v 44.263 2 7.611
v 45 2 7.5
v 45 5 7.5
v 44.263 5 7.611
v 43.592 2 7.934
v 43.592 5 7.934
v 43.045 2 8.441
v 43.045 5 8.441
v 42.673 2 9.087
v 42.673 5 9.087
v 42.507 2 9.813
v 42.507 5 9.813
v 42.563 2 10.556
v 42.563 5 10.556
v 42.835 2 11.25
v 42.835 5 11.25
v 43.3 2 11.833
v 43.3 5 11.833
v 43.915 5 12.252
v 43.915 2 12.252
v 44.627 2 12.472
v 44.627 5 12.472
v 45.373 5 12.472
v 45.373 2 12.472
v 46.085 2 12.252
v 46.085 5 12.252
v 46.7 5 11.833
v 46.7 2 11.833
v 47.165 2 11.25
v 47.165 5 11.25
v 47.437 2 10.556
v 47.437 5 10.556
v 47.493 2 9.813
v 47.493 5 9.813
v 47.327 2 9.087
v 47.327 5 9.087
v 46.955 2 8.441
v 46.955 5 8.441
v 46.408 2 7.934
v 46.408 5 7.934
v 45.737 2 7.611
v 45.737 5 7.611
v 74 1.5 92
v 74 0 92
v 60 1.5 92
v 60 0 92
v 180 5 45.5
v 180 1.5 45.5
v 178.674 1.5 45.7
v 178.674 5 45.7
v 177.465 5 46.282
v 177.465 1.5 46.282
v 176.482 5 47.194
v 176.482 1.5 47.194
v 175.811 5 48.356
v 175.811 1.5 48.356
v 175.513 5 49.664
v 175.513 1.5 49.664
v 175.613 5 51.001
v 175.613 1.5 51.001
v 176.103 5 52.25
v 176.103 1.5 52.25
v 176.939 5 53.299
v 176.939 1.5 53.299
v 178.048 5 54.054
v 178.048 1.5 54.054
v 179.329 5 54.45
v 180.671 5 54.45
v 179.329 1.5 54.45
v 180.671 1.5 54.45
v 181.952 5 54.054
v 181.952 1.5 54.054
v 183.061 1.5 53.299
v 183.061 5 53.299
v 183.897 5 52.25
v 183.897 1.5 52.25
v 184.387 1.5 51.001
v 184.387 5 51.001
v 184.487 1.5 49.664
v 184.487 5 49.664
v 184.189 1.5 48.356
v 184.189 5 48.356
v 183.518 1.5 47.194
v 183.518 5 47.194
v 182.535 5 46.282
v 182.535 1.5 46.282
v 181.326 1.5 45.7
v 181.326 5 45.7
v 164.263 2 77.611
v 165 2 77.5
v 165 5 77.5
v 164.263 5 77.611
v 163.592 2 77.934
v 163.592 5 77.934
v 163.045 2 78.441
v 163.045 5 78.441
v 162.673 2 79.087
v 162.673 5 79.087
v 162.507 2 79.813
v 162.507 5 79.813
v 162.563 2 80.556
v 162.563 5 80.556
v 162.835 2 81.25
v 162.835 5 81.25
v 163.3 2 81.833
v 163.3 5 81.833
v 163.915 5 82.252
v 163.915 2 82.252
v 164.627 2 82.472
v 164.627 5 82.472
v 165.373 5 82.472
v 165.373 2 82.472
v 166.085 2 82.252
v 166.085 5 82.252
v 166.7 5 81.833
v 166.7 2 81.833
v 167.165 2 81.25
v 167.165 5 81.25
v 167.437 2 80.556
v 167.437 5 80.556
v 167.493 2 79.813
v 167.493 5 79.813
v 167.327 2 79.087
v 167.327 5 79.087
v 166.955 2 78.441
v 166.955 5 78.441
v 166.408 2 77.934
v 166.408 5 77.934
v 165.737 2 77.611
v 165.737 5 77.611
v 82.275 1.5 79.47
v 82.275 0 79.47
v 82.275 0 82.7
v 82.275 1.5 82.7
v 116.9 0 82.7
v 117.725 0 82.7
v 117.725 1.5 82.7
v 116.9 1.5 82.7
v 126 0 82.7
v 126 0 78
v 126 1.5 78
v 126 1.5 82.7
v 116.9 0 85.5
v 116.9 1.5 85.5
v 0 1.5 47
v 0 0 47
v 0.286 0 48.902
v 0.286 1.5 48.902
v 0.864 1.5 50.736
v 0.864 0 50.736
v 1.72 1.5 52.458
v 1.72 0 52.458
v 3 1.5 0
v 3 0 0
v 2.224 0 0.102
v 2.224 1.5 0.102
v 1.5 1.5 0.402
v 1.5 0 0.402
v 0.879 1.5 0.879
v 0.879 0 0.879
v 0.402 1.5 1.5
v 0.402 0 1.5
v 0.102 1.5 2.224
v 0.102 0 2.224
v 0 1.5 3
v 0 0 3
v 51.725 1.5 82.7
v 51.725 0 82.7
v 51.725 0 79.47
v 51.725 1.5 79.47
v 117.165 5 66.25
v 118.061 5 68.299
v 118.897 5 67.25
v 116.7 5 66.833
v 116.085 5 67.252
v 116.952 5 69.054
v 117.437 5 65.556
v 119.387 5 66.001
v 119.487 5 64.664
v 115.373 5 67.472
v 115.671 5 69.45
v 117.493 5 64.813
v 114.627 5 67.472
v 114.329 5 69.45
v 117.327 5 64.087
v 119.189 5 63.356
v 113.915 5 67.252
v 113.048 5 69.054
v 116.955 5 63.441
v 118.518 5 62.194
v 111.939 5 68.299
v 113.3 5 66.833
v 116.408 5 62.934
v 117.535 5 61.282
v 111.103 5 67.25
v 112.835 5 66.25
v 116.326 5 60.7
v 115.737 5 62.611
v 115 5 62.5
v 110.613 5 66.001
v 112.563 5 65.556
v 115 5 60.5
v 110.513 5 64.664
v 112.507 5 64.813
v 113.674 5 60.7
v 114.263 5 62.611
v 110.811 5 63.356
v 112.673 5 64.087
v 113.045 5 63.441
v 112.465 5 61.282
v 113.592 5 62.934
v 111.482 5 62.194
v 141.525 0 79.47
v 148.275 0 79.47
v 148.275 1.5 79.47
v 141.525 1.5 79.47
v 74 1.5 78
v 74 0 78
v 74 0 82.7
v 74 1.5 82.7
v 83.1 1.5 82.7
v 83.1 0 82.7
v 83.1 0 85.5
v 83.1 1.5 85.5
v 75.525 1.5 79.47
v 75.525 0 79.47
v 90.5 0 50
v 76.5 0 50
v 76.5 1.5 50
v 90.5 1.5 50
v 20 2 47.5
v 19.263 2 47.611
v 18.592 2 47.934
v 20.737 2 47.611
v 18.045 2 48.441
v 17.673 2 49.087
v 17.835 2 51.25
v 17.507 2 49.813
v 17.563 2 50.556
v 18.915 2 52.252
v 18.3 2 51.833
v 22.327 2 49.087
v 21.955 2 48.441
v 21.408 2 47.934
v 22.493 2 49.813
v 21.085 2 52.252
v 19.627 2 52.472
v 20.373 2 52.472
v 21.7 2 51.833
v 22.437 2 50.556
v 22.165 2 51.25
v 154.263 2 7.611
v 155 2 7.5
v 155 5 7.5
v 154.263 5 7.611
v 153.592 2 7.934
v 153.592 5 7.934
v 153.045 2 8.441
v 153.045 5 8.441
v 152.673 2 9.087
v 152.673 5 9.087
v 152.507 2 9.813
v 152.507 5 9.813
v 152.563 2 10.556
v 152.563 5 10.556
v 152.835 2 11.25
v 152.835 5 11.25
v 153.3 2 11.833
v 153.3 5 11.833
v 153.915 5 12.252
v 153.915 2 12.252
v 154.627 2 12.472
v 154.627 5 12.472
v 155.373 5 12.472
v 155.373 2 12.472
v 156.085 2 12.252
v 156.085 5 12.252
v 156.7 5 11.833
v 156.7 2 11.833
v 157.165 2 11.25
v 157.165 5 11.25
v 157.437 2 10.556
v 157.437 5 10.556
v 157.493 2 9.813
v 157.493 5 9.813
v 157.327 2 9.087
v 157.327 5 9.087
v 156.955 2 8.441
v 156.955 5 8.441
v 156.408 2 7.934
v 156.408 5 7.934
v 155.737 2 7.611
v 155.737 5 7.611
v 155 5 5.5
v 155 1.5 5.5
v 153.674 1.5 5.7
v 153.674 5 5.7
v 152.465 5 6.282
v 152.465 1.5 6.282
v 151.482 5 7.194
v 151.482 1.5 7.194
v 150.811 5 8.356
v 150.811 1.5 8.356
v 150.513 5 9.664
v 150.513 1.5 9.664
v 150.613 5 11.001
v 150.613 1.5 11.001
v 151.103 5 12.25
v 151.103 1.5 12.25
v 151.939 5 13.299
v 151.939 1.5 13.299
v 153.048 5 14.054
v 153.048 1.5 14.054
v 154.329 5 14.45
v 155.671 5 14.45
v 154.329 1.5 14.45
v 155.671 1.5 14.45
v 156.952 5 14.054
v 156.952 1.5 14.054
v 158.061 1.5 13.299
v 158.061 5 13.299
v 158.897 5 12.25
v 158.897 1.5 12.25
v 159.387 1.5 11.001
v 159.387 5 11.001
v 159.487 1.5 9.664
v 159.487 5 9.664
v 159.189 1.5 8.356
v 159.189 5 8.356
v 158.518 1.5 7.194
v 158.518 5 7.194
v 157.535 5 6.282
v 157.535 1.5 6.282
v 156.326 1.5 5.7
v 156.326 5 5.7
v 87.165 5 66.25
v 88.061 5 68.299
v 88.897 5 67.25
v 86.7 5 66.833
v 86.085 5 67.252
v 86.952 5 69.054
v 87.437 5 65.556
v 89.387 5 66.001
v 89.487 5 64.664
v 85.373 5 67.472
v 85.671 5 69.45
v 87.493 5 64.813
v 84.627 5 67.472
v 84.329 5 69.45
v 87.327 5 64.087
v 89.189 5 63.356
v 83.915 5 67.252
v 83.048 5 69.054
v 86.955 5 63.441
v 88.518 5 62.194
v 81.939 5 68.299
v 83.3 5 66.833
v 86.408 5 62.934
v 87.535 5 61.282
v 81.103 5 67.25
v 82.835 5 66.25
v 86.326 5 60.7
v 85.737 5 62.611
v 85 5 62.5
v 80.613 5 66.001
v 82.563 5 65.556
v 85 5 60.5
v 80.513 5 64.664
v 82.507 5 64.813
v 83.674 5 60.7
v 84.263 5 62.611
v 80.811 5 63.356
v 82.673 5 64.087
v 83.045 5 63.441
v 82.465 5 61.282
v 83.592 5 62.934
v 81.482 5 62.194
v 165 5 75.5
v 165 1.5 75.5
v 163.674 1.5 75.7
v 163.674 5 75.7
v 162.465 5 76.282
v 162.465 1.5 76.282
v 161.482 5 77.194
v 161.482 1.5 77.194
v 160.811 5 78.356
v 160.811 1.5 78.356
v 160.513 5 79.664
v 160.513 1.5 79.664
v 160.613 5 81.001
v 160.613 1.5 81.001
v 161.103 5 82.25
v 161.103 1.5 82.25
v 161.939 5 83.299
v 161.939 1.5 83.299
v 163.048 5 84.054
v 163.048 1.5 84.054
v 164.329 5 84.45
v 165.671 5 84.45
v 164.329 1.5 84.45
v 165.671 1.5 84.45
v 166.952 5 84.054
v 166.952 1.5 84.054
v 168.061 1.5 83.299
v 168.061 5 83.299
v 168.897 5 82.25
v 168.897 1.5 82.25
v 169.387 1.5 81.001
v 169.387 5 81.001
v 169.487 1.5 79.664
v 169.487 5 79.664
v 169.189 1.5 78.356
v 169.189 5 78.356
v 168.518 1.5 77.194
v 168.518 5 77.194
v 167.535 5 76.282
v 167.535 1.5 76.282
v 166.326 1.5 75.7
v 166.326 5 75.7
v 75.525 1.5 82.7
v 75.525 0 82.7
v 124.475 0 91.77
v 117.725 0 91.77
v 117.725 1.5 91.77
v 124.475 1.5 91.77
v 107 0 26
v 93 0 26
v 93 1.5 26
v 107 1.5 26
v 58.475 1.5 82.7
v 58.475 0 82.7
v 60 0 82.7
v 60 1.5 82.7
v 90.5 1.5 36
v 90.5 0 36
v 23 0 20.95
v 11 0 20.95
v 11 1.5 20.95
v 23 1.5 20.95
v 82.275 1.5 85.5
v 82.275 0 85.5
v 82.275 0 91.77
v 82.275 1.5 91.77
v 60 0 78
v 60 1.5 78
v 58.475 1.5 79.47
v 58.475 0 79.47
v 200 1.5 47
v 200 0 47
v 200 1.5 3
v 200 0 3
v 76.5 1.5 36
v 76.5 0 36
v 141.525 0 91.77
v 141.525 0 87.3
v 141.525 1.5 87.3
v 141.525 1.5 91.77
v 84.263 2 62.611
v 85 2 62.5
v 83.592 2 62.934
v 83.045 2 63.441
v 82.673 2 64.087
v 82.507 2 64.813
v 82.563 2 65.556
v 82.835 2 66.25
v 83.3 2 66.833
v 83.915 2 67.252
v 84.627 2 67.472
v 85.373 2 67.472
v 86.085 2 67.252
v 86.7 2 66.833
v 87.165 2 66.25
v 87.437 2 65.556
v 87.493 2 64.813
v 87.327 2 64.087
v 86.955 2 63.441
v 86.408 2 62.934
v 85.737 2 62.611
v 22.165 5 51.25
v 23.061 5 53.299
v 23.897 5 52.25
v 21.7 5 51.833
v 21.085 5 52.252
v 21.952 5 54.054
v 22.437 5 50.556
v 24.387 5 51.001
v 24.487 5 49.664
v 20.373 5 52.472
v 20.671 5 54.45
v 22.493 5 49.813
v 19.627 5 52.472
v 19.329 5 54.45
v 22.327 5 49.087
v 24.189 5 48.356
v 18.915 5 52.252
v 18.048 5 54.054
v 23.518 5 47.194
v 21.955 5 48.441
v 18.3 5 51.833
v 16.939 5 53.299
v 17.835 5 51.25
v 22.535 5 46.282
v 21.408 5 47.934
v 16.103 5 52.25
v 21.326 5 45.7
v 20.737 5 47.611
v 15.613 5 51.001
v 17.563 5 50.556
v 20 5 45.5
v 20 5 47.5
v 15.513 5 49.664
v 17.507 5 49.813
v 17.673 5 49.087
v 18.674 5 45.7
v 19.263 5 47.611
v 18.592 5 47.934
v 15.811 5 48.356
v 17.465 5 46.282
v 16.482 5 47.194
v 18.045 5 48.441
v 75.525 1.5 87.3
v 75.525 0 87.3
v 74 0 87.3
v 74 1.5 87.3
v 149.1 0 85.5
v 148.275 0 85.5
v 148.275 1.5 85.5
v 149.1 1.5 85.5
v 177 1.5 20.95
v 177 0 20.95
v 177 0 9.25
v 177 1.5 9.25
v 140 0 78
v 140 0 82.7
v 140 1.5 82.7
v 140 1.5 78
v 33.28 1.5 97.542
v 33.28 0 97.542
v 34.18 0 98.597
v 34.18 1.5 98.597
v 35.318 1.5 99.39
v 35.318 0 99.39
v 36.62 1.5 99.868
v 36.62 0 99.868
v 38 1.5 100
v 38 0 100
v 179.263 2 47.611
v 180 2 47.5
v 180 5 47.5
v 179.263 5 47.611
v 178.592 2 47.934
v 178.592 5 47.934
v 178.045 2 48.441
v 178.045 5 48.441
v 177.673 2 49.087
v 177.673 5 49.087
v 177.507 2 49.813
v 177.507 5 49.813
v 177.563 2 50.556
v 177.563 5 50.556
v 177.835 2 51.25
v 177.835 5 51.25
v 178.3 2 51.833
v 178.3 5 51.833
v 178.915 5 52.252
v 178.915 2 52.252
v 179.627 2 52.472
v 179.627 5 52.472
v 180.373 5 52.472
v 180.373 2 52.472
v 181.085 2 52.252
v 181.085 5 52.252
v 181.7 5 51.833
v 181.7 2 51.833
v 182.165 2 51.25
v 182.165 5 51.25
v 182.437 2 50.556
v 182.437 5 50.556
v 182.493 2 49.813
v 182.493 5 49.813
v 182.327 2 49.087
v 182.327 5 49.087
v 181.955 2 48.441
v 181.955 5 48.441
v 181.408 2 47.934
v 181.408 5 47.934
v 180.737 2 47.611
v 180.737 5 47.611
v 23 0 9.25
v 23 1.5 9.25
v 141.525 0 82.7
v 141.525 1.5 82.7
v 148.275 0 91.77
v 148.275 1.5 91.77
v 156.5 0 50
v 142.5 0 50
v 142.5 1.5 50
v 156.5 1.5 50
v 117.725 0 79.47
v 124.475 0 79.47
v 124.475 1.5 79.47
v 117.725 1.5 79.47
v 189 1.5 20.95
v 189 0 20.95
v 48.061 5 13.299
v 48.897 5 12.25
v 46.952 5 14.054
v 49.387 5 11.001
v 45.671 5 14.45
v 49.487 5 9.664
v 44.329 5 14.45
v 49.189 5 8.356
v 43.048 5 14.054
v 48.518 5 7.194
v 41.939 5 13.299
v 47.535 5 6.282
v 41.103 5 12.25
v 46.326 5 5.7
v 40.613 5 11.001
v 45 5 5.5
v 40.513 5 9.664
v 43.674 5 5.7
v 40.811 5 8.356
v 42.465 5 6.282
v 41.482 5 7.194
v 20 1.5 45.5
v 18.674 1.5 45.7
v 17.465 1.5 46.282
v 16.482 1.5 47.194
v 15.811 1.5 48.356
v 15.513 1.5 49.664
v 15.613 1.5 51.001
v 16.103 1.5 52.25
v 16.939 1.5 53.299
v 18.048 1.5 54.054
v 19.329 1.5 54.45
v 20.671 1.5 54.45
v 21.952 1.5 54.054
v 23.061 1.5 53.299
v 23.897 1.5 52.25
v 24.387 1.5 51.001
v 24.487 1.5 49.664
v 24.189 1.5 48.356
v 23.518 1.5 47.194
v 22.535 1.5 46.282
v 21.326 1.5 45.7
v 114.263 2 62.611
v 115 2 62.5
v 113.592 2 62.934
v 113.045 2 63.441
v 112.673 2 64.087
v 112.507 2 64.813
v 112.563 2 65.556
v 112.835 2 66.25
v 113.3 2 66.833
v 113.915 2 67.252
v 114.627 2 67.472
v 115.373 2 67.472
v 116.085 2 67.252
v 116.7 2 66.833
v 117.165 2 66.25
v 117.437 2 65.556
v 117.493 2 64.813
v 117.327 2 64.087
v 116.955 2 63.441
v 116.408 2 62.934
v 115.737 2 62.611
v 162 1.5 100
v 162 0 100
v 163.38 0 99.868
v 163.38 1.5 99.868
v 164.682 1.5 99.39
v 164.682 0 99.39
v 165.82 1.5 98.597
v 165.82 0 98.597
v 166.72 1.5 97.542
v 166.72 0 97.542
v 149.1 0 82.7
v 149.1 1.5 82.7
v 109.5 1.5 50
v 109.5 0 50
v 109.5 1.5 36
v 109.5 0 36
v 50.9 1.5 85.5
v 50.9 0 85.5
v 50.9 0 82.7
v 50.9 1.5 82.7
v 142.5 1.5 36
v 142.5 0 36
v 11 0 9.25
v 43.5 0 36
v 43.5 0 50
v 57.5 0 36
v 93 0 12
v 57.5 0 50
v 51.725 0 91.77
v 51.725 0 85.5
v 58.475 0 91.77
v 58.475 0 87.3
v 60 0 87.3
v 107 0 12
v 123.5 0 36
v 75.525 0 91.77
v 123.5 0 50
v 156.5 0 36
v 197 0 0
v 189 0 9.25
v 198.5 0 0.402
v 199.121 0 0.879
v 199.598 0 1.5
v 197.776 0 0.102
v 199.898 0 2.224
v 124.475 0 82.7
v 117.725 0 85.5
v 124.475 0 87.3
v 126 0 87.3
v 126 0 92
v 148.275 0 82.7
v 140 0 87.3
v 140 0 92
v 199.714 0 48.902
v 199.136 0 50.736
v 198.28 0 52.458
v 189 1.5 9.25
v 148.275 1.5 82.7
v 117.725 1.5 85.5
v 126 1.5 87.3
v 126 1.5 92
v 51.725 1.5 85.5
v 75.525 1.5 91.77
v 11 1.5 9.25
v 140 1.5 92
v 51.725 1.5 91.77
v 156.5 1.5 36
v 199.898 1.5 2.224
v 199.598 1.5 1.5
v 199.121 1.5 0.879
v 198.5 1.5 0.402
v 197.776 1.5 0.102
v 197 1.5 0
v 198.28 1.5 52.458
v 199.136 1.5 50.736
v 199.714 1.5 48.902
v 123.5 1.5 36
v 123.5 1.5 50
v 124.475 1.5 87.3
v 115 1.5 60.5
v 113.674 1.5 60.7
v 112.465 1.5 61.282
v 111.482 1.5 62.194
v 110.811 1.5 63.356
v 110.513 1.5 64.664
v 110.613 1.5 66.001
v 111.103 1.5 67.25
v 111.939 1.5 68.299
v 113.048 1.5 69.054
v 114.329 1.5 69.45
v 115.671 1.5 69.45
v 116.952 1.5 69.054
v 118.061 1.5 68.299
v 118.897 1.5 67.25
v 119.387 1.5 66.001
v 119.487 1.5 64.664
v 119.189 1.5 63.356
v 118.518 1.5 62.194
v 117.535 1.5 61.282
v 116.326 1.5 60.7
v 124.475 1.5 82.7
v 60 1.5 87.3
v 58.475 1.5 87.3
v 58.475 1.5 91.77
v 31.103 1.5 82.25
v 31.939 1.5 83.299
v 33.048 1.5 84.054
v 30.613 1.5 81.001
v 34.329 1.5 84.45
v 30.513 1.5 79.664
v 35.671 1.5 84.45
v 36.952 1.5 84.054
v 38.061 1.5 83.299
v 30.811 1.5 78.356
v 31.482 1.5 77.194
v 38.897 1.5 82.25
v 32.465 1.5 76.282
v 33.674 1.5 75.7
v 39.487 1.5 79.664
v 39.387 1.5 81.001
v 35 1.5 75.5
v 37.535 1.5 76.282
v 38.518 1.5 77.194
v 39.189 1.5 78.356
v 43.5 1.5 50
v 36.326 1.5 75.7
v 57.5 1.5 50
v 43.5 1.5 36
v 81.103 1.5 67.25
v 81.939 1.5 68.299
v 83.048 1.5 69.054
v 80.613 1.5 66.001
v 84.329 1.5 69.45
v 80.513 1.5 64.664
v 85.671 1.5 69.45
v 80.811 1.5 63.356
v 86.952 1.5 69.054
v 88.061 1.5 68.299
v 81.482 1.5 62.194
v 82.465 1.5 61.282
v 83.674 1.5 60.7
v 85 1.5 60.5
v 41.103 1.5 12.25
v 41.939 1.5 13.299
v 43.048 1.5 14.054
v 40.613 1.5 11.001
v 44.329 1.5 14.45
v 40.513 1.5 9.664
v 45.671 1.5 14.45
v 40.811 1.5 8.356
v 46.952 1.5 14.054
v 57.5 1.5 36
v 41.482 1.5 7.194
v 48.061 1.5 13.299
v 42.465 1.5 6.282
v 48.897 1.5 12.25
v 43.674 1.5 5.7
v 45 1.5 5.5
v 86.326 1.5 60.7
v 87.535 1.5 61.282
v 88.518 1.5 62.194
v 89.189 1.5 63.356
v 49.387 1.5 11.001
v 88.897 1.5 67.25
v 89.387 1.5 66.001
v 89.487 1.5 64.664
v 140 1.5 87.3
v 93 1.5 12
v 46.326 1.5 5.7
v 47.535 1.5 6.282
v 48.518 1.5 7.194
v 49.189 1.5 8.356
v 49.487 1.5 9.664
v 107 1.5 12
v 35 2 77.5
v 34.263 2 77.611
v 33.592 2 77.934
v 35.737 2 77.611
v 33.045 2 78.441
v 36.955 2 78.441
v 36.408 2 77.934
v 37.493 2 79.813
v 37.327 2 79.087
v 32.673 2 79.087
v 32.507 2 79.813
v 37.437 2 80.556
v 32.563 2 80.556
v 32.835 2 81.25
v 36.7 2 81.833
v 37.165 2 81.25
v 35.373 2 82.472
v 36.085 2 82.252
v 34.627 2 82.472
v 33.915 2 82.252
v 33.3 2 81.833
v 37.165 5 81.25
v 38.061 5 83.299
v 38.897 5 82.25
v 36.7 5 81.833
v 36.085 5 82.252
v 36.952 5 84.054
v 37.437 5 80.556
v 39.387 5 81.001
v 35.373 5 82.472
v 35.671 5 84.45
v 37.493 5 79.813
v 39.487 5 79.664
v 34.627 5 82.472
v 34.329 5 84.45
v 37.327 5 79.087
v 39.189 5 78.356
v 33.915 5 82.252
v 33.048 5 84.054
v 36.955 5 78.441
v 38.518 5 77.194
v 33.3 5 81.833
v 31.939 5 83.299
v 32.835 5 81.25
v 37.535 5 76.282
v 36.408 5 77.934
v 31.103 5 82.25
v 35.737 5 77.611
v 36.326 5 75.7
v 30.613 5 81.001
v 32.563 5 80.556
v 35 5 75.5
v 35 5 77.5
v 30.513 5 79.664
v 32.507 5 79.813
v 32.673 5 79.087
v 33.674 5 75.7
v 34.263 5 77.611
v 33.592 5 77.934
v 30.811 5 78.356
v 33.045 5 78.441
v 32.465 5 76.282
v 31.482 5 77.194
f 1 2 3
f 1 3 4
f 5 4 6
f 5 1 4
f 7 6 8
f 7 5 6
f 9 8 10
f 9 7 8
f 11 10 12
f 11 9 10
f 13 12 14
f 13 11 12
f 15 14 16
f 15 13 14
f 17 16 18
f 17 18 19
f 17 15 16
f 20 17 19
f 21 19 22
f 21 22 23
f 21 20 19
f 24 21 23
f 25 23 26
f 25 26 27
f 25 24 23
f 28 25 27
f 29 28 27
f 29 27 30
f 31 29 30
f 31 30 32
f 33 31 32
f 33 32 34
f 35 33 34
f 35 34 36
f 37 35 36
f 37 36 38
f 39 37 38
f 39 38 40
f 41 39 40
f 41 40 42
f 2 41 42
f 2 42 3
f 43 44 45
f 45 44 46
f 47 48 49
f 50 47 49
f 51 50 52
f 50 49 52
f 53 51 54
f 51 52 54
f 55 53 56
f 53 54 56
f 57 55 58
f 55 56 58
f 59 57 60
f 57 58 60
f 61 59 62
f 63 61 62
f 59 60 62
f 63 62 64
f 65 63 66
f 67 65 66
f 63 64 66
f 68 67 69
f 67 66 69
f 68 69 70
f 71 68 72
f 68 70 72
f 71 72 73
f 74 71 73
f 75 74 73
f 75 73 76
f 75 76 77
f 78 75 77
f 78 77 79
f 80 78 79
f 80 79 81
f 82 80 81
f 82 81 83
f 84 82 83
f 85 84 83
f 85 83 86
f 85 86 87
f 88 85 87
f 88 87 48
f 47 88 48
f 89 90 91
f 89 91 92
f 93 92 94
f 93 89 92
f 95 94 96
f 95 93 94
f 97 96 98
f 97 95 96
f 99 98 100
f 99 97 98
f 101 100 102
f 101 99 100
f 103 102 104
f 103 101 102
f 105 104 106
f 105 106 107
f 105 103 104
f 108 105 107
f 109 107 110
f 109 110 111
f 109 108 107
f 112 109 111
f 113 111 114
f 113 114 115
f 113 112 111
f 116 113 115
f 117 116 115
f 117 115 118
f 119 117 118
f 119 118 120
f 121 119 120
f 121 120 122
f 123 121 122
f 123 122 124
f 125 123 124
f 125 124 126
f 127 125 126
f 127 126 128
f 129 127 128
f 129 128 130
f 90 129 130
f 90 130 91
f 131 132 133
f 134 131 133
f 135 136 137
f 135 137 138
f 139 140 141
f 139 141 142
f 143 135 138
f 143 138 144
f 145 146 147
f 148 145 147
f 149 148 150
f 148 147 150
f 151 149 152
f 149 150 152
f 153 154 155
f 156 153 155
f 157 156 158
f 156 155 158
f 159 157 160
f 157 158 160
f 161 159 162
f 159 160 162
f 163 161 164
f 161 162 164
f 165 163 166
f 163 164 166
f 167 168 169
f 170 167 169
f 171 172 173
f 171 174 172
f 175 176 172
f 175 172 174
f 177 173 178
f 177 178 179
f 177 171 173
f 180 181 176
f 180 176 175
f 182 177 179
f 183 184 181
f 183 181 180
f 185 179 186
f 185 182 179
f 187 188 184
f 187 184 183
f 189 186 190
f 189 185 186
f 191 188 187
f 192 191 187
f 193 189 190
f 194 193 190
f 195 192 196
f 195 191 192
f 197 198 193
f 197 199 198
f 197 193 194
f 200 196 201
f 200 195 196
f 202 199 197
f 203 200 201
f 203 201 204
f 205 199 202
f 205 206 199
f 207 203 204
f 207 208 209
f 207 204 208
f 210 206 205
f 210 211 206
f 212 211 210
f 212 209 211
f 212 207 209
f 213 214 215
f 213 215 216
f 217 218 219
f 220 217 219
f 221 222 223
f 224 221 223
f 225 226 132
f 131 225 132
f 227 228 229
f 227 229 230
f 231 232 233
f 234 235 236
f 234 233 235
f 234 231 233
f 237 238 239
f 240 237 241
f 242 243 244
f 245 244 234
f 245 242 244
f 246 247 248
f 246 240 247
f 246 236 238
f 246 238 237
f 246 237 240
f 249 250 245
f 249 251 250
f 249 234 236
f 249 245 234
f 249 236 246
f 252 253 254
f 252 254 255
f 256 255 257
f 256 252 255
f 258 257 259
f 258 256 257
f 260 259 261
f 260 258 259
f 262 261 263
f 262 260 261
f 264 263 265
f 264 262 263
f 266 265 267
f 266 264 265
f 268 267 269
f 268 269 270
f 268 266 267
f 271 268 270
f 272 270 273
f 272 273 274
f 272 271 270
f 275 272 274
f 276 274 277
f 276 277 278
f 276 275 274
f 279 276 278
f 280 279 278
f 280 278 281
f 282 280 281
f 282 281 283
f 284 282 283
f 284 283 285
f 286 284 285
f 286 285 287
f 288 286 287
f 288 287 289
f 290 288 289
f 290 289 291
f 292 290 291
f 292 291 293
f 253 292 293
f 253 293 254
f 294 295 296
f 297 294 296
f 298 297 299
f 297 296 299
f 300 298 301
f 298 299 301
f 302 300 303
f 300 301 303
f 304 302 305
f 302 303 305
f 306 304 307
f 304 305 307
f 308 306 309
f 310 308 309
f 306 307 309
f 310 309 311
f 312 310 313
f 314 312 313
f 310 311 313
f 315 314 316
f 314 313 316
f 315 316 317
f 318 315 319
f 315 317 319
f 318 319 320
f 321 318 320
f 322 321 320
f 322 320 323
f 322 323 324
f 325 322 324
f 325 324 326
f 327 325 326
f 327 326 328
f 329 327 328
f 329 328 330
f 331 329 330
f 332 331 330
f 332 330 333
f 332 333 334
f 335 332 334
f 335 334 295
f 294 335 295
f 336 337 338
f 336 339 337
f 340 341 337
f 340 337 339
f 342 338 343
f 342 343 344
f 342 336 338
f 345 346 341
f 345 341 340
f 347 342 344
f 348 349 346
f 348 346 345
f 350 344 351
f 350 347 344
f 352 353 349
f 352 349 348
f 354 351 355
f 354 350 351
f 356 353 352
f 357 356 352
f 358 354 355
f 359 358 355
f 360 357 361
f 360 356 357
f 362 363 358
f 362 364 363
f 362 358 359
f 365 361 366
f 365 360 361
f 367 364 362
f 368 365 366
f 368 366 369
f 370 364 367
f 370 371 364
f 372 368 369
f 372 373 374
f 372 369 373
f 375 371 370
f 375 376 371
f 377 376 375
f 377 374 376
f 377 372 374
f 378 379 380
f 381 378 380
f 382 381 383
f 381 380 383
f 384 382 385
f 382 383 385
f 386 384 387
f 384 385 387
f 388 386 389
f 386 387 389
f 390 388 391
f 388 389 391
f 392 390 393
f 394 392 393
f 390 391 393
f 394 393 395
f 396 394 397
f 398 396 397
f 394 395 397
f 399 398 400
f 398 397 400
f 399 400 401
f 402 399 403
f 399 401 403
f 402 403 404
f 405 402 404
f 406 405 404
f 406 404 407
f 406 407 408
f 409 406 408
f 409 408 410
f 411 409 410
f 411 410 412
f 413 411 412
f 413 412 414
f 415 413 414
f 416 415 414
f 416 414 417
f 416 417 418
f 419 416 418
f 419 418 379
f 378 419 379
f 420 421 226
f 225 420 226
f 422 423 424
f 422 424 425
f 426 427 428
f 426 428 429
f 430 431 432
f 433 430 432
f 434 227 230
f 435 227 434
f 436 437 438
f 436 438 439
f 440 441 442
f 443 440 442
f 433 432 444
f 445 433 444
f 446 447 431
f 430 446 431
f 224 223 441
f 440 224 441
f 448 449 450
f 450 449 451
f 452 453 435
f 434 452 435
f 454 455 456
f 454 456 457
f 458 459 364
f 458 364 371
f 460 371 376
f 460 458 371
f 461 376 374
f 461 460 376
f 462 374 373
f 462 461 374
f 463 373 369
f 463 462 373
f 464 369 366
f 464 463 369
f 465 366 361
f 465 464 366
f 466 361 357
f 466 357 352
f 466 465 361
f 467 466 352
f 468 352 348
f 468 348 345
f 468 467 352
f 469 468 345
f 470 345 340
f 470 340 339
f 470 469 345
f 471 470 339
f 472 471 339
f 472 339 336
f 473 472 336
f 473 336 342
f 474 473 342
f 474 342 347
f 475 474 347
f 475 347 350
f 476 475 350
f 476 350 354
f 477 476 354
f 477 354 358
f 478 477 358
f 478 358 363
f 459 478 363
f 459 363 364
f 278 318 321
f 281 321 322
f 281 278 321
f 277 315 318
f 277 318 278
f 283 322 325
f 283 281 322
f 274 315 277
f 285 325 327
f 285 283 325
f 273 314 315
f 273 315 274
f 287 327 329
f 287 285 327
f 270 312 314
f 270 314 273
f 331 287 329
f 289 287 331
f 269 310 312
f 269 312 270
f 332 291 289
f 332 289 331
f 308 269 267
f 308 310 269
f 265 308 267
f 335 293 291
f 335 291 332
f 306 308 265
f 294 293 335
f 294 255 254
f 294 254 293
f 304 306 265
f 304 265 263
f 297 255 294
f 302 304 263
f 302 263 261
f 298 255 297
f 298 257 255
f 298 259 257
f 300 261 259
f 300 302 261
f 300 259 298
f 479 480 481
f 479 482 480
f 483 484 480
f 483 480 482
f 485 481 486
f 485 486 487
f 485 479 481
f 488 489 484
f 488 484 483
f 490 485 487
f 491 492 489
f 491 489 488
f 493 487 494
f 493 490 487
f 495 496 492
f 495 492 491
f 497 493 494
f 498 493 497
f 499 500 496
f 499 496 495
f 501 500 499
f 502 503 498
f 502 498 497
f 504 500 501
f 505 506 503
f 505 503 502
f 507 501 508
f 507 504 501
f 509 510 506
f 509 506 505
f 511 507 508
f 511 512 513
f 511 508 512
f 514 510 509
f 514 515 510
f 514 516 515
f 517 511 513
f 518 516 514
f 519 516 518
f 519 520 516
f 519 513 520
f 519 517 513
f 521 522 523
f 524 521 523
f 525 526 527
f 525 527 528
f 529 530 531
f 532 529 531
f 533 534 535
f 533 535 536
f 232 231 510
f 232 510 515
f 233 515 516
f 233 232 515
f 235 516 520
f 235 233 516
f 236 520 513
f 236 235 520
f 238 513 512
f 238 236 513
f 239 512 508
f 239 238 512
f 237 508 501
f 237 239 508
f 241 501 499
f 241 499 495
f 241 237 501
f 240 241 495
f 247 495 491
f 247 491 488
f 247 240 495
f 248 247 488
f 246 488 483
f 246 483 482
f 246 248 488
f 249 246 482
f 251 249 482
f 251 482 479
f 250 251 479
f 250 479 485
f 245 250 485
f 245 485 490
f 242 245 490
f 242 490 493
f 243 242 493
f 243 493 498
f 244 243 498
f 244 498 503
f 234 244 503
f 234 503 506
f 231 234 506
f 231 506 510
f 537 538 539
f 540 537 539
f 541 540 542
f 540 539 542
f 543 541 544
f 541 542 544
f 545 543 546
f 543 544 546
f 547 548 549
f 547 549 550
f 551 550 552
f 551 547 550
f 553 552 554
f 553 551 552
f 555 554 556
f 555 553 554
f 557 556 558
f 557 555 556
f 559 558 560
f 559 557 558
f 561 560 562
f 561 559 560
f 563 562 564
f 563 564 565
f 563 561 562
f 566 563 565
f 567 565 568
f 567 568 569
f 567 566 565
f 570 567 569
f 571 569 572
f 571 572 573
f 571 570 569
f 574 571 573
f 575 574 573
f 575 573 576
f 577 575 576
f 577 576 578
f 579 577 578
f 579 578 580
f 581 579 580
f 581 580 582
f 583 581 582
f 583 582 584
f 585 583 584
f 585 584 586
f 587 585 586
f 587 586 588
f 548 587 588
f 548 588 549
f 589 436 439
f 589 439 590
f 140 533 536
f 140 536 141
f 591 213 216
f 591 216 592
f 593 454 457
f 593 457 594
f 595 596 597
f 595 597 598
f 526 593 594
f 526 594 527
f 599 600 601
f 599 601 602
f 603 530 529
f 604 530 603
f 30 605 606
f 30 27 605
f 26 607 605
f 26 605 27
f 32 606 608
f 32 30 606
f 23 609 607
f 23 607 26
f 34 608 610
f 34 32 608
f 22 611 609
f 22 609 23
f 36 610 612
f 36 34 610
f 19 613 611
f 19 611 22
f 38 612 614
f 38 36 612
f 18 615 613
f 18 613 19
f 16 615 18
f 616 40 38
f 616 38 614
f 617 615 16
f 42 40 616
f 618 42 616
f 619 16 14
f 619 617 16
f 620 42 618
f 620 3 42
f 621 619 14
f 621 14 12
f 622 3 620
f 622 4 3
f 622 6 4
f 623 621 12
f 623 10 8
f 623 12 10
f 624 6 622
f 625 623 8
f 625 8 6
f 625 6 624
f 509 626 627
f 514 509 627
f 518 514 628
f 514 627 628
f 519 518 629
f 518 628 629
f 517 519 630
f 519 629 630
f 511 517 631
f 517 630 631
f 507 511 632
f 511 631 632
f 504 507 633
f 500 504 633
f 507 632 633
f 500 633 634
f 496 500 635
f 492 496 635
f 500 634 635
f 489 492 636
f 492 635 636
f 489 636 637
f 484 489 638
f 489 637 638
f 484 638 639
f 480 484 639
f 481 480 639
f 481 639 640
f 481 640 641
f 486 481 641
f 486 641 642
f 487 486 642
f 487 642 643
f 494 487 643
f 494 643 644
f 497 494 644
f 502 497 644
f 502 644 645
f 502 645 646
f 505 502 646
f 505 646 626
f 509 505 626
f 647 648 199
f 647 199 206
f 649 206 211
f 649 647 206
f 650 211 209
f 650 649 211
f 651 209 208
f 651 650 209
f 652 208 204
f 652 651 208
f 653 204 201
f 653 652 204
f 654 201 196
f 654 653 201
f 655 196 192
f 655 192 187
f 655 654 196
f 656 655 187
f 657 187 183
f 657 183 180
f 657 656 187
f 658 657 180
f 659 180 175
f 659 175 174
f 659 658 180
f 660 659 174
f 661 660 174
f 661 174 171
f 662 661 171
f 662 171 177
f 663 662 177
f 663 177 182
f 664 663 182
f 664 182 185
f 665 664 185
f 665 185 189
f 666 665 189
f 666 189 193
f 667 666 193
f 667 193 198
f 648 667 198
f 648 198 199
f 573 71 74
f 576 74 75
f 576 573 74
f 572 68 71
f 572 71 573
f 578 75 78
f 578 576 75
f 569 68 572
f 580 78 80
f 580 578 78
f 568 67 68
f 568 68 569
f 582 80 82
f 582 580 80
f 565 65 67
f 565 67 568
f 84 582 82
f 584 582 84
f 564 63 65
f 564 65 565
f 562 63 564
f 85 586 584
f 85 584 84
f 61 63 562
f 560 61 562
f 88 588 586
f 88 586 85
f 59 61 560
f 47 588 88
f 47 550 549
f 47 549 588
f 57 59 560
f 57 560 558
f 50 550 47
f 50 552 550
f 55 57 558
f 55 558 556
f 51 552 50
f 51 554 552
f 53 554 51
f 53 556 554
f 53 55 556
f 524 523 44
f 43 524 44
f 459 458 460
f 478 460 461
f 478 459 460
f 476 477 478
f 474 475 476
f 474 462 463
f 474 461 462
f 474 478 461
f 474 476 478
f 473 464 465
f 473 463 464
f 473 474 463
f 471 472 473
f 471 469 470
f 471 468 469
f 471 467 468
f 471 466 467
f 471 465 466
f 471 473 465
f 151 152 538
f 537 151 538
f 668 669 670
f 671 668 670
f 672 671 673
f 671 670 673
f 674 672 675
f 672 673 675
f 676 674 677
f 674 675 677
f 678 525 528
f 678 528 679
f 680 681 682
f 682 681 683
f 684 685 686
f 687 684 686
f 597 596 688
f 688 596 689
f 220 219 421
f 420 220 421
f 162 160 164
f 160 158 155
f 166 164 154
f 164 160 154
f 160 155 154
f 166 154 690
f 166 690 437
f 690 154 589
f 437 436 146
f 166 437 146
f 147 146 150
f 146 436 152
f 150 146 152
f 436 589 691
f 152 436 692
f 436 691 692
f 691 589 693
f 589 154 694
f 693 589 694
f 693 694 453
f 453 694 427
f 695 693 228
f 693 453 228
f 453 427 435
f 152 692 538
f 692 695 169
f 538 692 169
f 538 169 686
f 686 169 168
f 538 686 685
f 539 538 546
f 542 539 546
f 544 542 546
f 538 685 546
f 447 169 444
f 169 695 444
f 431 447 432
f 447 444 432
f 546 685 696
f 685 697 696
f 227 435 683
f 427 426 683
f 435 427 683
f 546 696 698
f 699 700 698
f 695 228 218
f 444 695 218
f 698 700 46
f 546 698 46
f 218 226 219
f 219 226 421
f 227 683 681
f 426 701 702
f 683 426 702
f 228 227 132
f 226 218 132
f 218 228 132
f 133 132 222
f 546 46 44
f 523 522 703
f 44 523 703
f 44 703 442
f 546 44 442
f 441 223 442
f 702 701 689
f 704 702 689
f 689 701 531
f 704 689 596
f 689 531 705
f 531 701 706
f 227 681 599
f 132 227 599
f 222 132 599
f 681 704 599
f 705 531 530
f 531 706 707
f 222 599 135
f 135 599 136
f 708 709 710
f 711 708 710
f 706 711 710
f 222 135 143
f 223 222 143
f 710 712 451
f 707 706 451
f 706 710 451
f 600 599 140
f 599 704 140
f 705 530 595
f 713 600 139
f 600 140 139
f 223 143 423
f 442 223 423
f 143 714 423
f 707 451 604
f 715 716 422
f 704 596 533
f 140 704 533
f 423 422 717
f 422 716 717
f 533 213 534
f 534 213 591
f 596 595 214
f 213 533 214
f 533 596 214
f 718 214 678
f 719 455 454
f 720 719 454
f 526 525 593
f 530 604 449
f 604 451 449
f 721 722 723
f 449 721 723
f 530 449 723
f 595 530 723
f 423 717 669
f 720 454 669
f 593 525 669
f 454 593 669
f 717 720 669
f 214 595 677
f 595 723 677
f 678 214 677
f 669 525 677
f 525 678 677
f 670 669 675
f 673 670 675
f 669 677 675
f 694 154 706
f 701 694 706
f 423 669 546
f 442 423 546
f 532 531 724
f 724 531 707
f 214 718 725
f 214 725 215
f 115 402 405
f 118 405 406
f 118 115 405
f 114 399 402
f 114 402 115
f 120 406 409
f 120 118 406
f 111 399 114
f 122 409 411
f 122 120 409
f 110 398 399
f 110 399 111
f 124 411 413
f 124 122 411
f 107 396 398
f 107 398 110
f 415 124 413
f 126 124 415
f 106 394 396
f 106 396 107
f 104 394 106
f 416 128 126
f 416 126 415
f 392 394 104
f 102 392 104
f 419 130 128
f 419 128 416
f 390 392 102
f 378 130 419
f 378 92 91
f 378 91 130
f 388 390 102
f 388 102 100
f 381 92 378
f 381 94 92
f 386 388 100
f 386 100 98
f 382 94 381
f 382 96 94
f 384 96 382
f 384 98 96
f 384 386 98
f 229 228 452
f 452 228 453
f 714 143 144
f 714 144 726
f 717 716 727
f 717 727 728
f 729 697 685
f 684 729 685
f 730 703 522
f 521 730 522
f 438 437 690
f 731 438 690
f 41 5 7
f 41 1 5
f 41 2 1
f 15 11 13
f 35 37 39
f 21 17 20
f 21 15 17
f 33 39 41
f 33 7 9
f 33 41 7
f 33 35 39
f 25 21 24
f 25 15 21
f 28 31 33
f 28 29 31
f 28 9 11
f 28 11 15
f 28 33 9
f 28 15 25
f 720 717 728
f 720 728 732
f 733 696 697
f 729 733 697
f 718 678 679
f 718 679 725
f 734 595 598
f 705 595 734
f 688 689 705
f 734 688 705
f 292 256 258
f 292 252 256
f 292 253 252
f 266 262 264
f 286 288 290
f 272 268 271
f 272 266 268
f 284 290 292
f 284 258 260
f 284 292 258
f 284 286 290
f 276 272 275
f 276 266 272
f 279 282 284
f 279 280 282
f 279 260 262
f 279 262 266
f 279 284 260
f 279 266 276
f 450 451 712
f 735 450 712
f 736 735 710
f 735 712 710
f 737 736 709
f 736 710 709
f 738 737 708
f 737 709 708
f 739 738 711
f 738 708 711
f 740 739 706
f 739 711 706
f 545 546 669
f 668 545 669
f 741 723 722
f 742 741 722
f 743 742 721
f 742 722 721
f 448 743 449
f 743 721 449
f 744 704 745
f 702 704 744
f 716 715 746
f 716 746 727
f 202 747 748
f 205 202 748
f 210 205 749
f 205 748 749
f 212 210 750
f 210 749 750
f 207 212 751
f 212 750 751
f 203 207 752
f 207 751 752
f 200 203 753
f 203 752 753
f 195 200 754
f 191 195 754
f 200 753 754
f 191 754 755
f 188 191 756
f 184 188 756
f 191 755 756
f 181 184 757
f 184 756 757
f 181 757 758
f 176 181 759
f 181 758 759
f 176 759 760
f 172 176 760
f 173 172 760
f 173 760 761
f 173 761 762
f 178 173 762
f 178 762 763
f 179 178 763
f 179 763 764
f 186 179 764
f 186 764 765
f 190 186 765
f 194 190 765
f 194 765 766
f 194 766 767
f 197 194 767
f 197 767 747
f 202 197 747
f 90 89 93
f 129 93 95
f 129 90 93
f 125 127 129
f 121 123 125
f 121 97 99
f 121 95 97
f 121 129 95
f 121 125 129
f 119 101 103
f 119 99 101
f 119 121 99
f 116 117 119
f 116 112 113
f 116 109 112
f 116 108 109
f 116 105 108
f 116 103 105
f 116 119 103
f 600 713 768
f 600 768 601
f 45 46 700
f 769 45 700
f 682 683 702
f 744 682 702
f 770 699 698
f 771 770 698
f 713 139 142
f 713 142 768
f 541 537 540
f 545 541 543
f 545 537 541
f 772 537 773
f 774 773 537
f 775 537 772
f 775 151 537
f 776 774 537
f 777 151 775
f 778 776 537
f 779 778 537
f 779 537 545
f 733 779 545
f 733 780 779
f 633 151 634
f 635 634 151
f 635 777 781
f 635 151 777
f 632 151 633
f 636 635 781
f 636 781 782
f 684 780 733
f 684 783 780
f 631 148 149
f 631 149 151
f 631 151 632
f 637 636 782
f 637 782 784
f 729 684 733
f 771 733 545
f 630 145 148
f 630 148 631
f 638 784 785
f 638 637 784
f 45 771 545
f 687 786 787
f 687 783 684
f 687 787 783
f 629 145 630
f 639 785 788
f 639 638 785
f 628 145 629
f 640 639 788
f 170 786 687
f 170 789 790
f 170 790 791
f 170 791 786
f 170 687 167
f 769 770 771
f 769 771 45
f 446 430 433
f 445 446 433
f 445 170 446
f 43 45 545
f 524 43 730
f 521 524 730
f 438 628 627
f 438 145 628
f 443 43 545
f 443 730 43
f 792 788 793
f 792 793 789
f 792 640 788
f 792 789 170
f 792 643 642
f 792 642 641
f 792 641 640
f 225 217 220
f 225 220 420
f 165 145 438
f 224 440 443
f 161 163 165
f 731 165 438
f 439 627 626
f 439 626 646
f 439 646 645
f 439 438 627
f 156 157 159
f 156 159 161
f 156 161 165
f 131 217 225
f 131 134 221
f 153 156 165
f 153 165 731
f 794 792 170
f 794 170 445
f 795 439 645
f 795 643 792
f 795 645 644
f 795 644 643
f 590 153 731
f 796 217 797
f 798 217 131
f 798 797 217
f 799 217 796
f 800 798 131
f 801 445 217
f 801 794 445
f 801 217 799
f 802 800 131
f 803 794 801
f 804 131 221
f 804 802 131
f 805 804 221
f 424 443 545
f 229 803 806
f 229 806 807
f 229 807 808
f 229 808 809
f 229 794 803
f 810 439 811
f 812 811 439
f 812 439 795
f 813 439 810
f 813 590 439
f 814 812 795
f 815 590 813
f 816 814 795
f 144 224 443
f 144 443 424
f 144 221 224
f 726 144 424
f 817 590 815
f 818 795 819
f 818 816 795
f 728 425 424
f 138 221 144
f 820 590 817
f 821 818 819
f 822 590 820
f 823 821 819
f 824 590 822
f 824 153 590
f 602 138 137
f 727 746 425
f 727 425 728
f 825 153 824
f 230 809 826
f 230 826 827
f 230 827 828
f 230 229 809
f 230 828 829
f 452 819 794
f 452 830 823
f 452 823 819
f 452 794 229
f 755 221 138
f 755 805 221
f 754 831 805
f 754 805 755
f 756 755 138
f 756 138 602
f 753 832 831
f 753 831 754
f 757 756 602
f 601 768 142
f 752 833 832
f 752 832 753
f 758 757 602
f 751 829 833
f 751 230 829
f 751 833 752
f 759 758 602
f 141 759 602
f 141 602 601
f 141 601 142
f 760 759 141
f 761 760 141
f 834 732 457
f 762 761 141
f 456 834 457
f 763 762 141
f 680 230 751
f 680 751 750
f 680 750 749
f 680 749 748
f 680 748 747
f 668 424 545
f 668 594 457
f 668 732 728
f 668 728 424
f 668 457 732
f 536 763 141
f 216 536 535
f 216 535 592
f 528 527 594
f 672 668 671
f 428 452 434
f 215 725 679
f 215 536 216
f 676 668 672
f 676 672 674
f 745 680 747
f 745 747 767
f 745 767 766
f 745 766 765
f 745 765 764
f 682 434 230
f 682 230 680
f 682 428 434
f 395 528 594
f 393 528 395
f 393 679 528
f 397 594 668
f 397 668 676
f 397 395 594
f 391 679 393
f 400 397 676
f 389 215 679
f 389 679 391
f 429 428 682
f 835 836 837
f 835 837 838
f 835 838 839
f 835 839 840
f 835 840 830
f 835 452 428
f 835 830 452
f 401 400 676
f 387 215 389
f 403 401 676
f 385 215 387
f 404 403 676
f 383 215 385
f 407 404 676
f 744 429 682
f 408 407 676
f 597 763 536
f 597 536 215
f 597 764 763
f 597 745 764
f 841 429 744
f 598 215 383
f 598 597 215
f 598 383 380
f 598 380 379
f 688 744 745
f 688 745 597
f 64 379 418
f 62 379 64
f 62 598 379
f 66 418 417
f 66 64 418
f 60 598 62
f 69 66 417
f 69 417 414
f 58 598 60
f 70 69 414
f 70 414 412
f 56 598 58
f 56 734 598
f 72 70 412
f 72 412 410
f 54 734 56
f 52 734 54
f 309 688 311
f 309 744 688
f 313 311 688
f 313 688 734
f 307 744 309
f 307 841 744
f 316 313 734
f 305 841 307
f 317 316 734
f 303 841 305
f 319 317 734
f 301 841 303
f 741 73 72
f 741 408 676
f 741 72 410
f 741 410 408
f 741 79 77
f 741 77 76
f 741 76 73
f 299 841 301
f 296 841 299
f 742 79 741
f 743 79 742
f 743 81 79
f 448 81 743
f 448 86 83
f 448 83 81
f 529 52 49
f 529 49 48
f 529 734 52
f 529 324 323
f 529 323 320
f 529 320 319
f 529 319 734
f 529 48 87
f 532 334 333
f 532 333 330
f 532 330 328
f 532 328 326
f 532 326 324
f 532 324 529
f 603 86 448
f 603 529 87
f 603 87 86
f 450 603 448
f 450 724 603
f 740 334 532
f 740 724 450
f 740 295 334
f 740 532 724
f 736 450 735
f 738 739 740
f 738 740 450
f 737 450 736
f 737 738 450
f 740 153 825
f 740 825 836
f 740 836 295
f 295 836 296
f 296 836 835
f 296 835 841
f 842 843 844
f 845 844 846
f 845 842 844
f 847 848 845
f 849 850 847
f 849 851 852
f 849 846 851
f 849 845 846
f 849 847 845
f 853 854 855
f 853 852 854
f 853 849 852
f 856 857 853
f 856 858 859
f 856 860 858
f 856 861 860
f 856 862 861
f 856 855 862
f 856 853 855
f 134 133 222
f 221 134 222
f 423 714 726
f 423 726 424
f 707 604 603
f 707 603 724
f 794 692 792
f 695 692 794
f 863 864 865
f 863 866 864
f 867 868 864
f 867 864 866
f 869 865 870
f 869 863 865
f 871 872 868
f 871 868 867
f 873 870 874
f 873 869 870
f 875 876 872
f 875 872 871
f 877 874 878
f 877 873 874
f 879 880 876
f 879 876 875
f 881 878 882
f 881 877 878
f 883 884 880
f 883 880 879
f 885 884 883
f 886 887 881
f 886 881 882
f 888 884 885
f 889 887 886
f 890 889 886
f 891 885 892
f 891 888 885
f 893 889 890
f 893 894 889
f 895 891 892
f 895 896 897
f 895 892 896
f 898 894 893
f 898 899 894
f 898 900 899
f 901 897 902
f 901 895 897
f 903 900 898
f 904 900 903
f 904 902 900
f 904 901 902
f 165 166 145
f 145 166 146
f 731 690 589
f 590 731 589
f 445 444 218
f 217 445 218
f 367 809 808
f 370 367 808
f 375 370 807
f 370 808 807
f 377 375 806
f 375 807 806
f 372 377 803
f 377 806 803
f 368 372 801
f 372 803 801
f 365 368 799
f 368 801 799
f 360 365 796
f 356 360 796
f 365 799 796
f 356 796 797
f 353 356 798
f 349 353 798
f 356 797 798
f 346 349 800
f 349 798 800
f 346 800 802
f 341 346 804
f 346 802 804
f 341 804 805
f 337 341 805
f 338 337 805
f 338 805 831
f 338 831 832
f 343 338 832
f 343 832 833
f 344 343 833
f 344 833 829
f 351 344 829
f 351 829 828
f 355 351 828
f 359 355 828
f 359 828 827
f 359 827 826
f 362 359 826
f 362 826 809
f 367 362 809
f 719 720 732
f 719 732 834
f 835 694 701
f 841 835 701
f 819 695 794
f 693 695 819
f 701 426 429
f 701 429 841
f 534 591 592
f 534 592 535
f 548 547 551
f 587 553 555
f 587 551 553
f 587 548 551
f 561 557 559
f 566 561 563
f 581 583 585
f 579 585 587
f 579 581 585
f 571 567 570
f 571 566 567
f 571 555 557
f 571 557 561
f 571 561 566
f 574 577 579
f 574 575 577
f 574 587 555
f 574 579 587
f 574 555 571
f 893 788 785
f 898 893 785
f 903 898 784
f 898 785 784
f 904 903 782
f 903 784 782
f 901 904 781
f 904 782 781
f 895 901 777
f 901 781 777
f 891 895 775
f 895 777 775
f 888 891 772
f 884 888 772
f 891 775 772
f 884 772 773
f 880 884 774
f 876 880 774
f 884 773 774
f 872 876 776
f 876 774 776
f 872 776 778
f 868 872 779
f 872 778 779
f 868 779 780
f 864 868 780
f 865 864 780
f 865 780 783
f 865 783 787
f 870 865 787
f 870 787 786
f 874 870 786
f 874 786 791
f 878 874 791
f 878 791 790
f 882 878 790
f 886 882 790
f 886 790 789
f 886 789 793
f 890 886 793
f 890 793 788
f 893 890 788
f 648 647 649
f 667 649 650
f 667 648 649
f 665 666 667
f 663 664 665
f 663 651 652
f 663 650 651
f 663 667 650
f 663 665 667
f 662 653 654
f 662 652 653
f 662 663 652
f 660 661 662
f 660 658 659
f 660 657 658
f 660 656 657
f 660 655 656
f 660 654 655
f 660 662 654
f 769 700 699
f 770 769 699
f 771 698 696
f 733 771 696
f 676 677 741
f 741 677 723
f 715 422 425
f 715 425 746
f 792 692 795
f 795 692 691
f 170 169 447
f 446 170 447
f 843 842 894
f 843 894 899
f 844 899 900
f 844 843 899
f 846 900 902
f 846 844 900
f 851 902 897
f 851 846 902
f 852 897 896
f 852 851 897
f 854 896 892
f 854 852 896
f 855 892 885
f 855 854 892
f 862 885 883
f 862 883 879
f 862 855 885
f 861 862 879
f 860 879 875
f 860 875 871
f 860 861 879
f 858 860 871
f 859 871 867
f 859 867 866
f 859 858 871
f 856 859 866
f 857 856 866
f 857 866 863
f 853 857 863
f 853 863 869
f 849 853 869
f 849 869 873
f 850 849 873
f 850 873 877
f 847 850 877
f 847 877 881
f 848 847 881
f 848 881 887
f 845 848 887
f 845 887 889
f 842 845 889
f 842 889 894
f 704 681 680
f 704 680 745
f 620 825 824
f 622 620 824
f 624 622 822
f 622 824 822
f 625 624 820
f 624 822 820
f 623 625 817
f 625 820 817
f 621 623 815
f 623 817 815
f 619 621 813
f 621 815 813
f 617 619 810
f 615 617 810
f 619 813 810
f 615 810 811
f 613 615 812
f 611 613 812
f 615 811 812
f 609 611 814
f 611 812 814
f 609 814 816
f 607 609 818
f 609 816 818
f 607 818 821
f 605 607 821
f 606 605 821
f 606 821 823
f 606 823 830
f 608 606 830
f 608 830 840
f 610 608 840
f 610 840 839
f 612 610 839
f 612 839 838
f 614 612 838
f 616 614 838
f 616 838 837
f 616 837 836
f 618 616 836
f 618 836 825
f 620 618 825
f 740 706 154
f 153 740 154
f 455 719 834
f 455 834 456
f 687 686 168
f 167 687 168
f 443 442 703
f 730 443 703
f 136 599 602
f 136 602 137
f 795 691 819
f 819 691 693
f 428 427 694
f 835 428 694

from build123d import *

# Parameters (mm, degrees)
SKETCH_1_W      = 14
SKETCH_1_H      = 14
SKETCH_1_W_2    = 12
SKETCH_1_H_2    = 11.7
EXTRUDE_1_DEPTH = 1.5
SKETCH_2_R      = 4.5
SKETCH_2_R_2    = 2.5
EXTRUDE_2_DEPTH = 5
SKETCH_3_R      = 2.5
EXTRUDE_3_DEPTH = 2


with BuildPart() as part:
    # 草图1 → 凸台-拉伸1 (new body)
    with BuildSketch(Plane(origin=(0, 0, 0), x_dir=(1, 0, 0), z_dir=(0, 1, 0))):
        with BuildLine():
            Line((197, 0), (3, 0))
            ThreePointArc((3, 0), (0.878679656, -0.878679656), (0, -3))
            Line((0, -3), (0, -47))
            ThreePointArc((0, -47), (0.538734236, -49.830178992), (1.720387033, -52.457695762))
            Line((1.720387033, -52.457695762), (33.279612967, -97.542304238))
            ThreePointArc((33.279612967, -97.542304238), (35.317699373, -99.389808931), (38, -100))
            Line((38, -100), (162, -100))
            ThreePointArc((162, -100), (164.682300627, -99.389808931), (166.720387033, -97.542304238))
            Line((166.720387033, -97.542304238), (198.279612967, -52.457695762))
            ThreePointArc((198.279612967, -52.457695762), (199.461265764, -49.830178992), (200, -47))
            Line((200, -47), (200, -3))
            ThreePointArc((200, -3), (199.121320344, -0.878679656), (197, 0))
        make_face()
        with Locations((100, -19)):
            Rectangle(SKETCH_1_W, SKETCH_1_H, mode=Mode.SUBTRACT)
        with Locations((83.5, -43)):
            Rectangle(SKETCH_1_W, SKETCH_1_H, mode=Mode.SUBTRACT)
        with Locations((116.5, -43)):
            Rectangle(SKETCH_1_W, SKETCH_1_H, mode=Mode.SUBTRACT)
        with Locations((50.5, -43)):
            Rectangle(SKETCH_1_W, SKETCH_1_H, mode=Mode.SUBTRACT)
        with Locations((149.5, -43)):
            Rectangle(SKETCH_1_W, SKETCH_1_H, mode=Mode.SUBTRACT)
        Polygon((60, -78), (74, -78), (74, -82.7), (75.525, -82.7), (75.525, -79.47), (82.275, -79.47), (82.275, -82.7), (83.1, -82.7), (83.1, -85.5), (82.275, -85.5), (82.275, -91.77), (75.525, -91.77), (75.525, -87.3), (74, -87.3), (74, -92), (60, -92), (60, -87.3), (58.475, -87.3), (58.475, -91.77), (51.725, -91.77), (51.725, -85.5), (50.9, -85.5), (50.9, -82.7), (51.725, -82.7), (51.725, -79.47), (58.475, -79.47), (58.475, -82.7), (60, -82.7), align=None, mode=Mode.SUBTRACT)
        Polygon((140, -78), (126, -78), (126, -82.7), (124.475, -82.7), (124.475, -79.47), (117.725, -79.47), (117.725, -82.7), (116.9, -82.7), (116.9, -85.5), (117.725, -85.5), (117.725, -91.77), (124.475, -91.77), (124.475, -87.3), (126, -87.3), (126, -92), (140, -92), (140, -87.3), (141.525, -87.3), (141.525, -91.77), (148.275, -91.77), (148.275, -85.5), (149.1, -85.5), (149.1, -82.7), (148.275, -82.7), (148.275, -79.47), (141.525, -79.47), (141.525, -82.7), (140, -82.7), align=None, mode=Mode.SUBTRACT)
        with Locations((17, -15.1)):
            Rectangle(SKETCH_1_W_2, SKETCH_1_H_2, mode=Mode.SUBTRACT)
        with Locations((183, -15.1)):
            Rectangle(SKETCH_1_W_2, SKETCH_1_H_2, mode=Mode.SUBTRACT)
    extrude(amount=EXTRUDE_1_DEPTH)

    # 草图2 → 凸台-拉伸2 (add)
    # profile 1 of 8: a face of its own
    with BuildSketch(Plane(origin=(0, 0, 0), x_dir=(1, 0, 0), z_dir=(0, 1, 0))):
        with Locations(Location((35, -80, 0), (0, 0, 90))):
            Circle(SKETCH_2_R)
        with Locations(Location((35, -80, 0), (0, 0, 90))):
            Circle(SKETCH_2_R_2, mode=Mode.SUBTRACT)
    # profile 2 of 8: a face of its own
    with BuildSketch(Plane(origin=(0, 0, 0), x_dir=(1, 0, 0), z_dir=(0, 1, 0))):
        with Locations(Location((20, -50, 0), (0, 0, 90))):
            Circle(SKETCH_2_R)
        with Locations(Location((20, -50, 0), (0, 0, 90))):
            Circle(SKETCH_2_R_2, mode=Mode.SUBTRACT)
    # profile 3 of 8: a face of its own
    with BuildSketch(Plane(origin=(0, 0, 0), x_dir=(1, 0, 0), z_dir=(0, 1, 0))):
        with Locations(Location((45, -10, 0), (0, 0, 90))):
            Circle(SKETCH_2_R)
        with Locations(Location((45, -10, 0), (0, 0, 90))):
            Circle(SKETCH_2_R_2, mode=Mode.SUBTRACT)
    # profile 4 of 8: a face of its own
    with BuildSketch(Plane(origin=(0, 0, 0), x_dir=(1, 0, 0), z_dir=(0, 1, 0))):
        with Locations(Location((85, -65, 0), (0, 0, 90))):
            Circle(SKETCH_2_R)
        with Locations(Location((85, -65, 0), (0, 0, 90))):
            Circle(SKETCH_2_R_2, mode=Mode.SUBTRACT)
    # profile 5 of 8: a face of its own
    with BuildSketch(Plane(origin=(0, 0, 0), x_dir=(1, 0, 0), z_dir=(0, 1, 0))):
        with Locations(Location((115, -65, 0), (0, 0, 90))):
            Circle(SKETCH_2_R)
        with Locations(Location((115, -65, 0), (0, 0, 90))):
            Circle(SKETCH_2_R_2, mode=Mode.SUBTRACT)
    # profile 6 of 8: a face of its own
    with BuildSketch(Plane(origin=(0, 0, 0), x_dir=(1, 0, 0), z_dir=(0, 1, 0))):
        with Locations(Location((165, -80, 0), (0, 0, 90))):
            Circle(SKETCH_2_R)
        with Locations(Location((165, -80, 0), (0, 0, 90))):
            Circle(SKETCH_2_R_2, mode=Mode.SUBTRACT)
    # profile 7 of 8: a face of its own
    with BuildSketch(Plane(origin=(0, 0, 0), x_dir=(1, 0, 0), z_dir=(0, 1, 0))):
        with Locations(Location((155, -10, 0), (0, 0, 90))):
            Circle(SKETCH_2_R)
        with Locations(Location((155, -10, 0), (0, 0, 90))):
            Circle(SKETCH_2_R_2, mode=Mode.SUBTRACT)
    # profile 8 of 8: a face of its own
    with BuildSketch(Plane(origin=(0, 0, 0), x_dir=(1, 0, 0), z_dir=(0, 1, 0))):
        with Locations(Location((180, -50, 0), (0, 0, 90))):
            Circle(SKETCH_2_R)
        with Locations(Location((180, -50, 0), (0, 0, 90))):
            Circle(SKETCH_2_R_2, mode=Mode.SUBTRACT)
    extrude(amount=EXTRUDE_2_DEPTH)

    # 草图3 → 凸台-拉伸3 (add)
    with BuildSketch(Plane(origin=(0, 0, 0), x_dir=(1, 0, 0), z_dir=(0, 1, 0))):
        with Locations(Location((180, -50, 0), (0, 0, 270))):
            Circle(SKETCH_3_R)
        with Locations(Location((165, -80, 0), (0, 0, 270))):
            Circle(SKETCH_3_R)
        with Locations(Location((115, -65, 0), (0, 0, 270))):
            Circle(SKETCH_3_R)
        with Locations(Location((155, -10, 0), (0, 0, 270))):
            Circle(SKETCH_3_R)
        with Locations(Location((45, -10, 0), (0, 0, 270))):
            Circle(SKETCH_3_R)
        with Locations(Location((20, -50, 0), (0, 0, 270))):
            Circle(SKETCH_3_R)
        with Locations(Location((35, -80, 0), (0, 0, 270))):
            Circle(SKETCH_3_R)
        with Locations(Location((85, -65, 0), (0, 0, 270))):
            Circle(SKETCH_3_R)
    extrude(amount=EXTRUDE_3_DEPTH)


solid = part.part
